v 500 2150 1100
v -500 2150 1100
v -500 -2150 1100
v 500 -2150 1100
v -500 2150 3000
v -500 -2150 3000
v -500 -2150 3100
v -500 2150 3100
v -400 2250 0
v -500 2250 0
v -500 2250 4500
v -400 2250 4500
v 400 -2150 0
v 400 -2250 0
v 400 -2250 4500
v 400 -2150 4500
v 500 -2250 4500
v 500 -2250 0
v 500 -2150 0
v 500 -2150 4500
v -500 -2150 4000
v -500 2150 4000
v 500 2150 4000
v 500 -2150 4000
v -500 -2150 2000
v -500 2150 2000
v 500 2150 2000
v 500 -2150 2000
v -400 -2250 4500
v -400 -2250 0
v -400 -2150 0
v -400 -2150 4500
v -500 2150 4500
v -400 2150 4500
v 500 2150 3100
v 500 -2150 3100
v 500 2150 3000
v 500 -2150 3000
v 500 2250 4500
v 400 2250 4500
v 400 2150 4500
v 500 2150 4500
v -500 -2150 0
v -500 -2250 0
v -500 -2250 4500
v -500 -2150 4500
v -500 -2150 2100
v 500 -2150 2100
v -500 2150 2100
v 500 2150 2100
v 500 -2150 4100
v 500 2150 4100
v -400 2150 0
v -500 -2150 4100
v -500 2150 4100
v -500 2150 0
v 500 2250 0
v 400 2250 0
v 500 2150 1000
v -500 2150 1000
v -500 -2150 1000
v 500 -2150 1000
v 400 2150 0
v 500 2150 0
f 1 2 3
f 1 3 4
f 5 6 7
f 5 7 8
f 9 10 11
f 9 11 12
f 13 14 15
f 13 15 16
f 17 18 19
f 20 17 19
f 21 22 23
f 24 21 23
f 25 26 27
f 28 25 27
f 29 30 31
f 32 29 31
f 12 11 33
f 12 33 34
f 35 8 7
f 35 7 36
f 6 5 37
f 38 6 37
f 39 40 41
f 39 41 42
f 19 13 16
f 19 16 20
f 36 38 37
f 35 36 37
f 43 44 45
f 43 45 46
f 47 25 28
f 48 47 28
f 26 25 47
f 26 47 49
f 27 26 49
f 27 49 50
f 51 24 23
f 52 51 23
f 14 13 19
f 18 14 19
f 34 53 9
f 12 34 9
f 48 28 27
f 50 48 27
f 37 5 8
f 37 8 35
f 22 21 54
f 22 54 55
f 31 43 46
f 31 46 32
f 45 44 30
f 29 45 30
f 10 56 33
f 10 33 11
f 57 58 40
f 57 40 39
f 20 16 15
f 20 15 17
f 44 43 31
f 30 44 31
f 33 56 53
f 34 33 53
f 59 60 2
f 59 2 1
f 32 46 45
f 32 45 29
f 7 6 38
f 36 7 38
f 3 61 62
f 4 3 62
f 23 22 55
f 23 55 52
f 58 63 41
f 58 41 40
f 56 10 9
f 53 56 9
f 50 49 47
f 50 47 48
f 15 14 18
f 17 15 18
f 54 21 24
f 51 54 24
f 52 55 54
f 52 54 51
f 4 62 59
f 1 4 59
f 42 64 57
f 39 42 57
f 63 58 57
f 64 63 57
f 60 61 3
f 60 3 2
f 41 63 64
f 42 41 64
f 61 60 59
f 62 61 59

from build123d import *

# Parameters (mm, degrees)
F0_W      = 100
F0_H      = 100
F9_DEPTH  = 4500
F5_W      = 1000
F5_H      = 4300
F10_DEPTH = 100
F6_W      = 1000
F6_H      = 4300
F11_DEPTH = 100
F7_W      = 1000
F7_H      = 4300
F12_DEPTH = 100
F8_W      = 1000
F8_H      = 4300
F13_DEPTH = 100


with BuildPart() as f9:
    # F0 (on Top) → F9 (new body)
    with BuildSketch(Plane.XY):
        with Locations((-450, 2200)):
            Rectangle(F0_W, F0_H)
        with Locations((450, 2200)):
            Rectangle(F0_W, F0_H)
        with Locations((-450, -2200)):
            Rectangle(F0_W, F0_H)
        with Locations((450, -2200)):
            Rectangle(F0_W, F0_H)
    extrude(amount=F9_DEPTH)


with BuildPart() as f10:
    # F5 (on offset) → F10 (new body)
    with BuildSketch(Plane.XY.offset(1000)):
        Rectangle(F5_W, F5_H)
    extrude(amount=F10_DEPTH)


with BuildPart() as f11:
    # F6 (on offset) → F11 (new body)
    with BuildSketch(Plane.XY.offset(2000)):
        Rectangle(F6_W, F6_H)
    extrude(amount=F11_DEPTH)


with BuildPart() as f12:
    # F7 (on offset) → F12 (new body)
    with BuildSketch(Plane.XY.offset(3000)):
        Rectangle(F7_W, F7_H)
    extrude(amount=F12_DEPTH)


with BuildPart() as f13:
    # F8 (on offset) → F13 (new body)
    with BuildSketch(Plane.XY.offset(4000)):
        Rectangle(F8_W, F8_H)
    extrude(amount=F13_DEPTH)


solid = Compound([f9.part, f10.part, f11.part, f12.part, f13.part])
